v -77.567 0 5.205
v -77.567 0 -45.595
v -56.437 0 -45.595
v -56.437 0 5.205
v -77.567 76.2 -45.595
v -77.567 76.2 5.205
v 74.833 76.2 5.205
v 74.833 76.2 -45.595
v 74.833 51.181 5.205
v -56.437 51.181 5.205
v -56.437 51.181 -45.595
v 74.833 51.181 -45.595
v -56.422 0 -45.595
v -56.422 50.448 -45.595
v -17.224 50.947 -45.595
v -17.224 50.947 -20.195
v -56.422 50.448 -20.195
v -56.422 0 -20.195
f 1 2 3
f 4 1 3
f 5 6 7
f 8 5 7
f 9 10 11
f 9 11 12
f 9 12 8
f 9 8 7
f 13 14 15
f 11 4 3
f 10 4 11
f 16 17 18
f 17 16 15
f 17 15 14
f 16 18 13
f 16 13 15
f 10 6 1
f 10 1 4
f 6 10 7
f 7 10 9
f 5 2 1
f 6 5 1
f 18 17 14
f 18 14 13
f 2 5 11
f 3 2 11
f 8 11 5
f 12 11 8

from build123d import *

# Parameters (mm, degrees)
F0_W     = 152.4
F0_H     = 50.8
F1_DEPTH = 76.2
F2_W     = 131.2693012774
F2_H     = 51.1809997261
F3_DEPTH = 50.8
F6_DEPTH = 50.8
F7_DEPTH = 25.4


with BuildPart() as f1:
    # F0 (on Front) → F1 (new body)
    with BuildSketch(Plane.XZ):
        with Locations((-1.3673976064, -20.1954185038)):
            Rectangle(F0_W, F0_H)
    extrude(amount=-F1_DEPTH)

    # F2 (on face) → F3 (cut)
    with BuildSketch(Plane.XY.offset(5.2045814962)):
        with Locations((9.1979517549, 25.590499863)):
            Rectangle(F2_W, F2_H)
    extrude(amount=-F3_DEPTH, mode=Mode.SUBTRACT)


with BuildPart() as f6:
    # F5 (on face) → F6 (new body)
    with BuildSketch(Plane.XY.offset(5.2045814962)):
        Polygon((-56.4218983054, 0), (-17.2239702284, 50.9468898916), (-56.4218983054, 50.4475539979), align=None)
    extrude(amount=-F6_DEPTH)

    # F7 (cut): a face of the model
    f7_faces = [f6.faces().sort_by_distance(p)[0] for p in [
        (-43.3559222797, 33.7981479632, 5.2045814962),
    ]]
    extrude(f7_faces, amount=-F7_DEPTH, mode=Mode.SUBTRACT)


solid = Compound([f1.part, f6.part])
